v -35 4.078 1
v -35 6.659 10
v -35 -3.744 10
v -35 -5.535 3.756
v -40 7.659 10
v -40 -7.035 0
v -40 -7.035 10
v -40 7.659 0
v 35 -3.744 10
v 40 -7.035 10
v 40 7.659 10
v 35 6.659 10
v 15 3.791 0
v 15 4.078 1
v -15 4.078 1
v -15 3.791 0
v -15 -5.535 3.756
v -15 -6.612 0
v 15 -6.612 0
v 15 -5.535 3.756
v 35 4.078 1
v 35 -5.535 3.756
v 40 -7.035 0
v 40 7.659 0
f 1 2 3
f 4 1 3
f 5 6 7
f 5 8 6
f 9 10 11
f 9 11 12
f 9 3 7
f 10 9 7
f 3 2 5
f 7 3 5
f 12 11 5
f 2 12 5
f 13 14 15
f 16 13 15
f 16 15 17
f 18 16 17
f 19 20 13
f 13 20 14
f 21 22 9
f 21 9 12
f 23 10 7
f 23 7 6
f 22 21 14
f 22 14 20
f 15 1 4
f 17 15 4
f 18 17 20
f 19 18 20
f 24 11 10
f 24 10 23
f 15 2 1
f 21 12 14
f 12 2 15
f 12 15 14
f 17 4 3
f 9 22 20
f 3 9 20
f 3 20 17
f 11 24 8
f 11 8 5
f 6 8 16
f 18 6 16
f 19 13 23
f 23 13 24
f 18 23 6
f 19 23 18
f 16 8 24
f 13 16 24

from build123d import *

# Parameters (mm, degrees)
F1_DEPTH = 35
F3_W     = 14.1933254312
F3_H     = 10
F4_DEPTH = 5
F6_DEPTH = 5
F8_DEPTH = 0.5
F9_DEPTH = 200


with BuildPart() as f1:
    # F0 (on Right) → F1 (new body, symmetric)
    with BuildSketch(Plane.YZ):
        Polygon((4.0779394949, -1.9816074769), (-5.5346774645, 0.7747660812), (-3.7443463919, 7.0183925231), (-6.5346774645, 7.0183925231), (-6.5346774645, -2.9816074769), (7.6586479667, -2.9816074769), (7.6586479667, 7.0183925231), (6.6586479667, 7.0183925231), align=None)
    extrude(amount=F1_DEPTH, both=True)


with BuildPart() as f1_1:
    # F2: moved
    add(f1.part.moved(Location((0, 0, 2.9817))))

    # F3 (on face) → F4 (join)
    with BuildSketch(Plane(origin=(-35, 0, 0), x_dir=(0, -1, 0), z_dir=(-1, 0, 0))):
        with Locations((-0.5619852511, 5.0000925231)):
            Rectangle(F3_W, F3_H)
    extrude(amount=F4_DEPTH)

    # F5 (on face) → F6 (join)
    with BuildSketch(Plane.YZ.offset(35)):
        Polygon((-3.7443463919, 10.0000925231), (-6.5346774645, 10.0000925231), (-6.5346774645, 9.25231e-05), (7.6586479667, 9.25231e-05), (7.6586479667, 10.0000925231), (6.6586479667, 10.0000925231), (4.0779394949, 1.0000925231), (-5.5346774645, 3.7564660812), align=None)
        Polygon((6.6586479667, 10.0000925231), (-3.7443463919, 10.0000925231), (-5.5346774645, 3.7564660812), (4.0779394949, 1.0000925231), align=None)
    extrude(amount=F6_DEPTH)

    # F8 (add): a face of the model
    f8_faces = [f1_1.faces().sort_by_distance(p)[0] for p in [
        (0, -6.5346774645, 5.0000925231),
    ]]
    extrude(f8_faces, amount=F8_DEPTH)

    # F7 (on face) → F9 (cut)
    with BuildSketch(Plane(origin=(0, 0.574809482, 2.00459889), x_dir=(1, 0, 0), z_dir=(0, 0.2756373558, 0.9612616959))):
        Polygon((15, 3.6443041761), (0, 3.6443041761), (-15, 3.6443041761), (-15, -6.3556958239), (15, -6.3556958239), align=None)
    extrude(amount=-F9_DEPTH, mode=Mode.SUBTRACT)


solid = f1_1.part
